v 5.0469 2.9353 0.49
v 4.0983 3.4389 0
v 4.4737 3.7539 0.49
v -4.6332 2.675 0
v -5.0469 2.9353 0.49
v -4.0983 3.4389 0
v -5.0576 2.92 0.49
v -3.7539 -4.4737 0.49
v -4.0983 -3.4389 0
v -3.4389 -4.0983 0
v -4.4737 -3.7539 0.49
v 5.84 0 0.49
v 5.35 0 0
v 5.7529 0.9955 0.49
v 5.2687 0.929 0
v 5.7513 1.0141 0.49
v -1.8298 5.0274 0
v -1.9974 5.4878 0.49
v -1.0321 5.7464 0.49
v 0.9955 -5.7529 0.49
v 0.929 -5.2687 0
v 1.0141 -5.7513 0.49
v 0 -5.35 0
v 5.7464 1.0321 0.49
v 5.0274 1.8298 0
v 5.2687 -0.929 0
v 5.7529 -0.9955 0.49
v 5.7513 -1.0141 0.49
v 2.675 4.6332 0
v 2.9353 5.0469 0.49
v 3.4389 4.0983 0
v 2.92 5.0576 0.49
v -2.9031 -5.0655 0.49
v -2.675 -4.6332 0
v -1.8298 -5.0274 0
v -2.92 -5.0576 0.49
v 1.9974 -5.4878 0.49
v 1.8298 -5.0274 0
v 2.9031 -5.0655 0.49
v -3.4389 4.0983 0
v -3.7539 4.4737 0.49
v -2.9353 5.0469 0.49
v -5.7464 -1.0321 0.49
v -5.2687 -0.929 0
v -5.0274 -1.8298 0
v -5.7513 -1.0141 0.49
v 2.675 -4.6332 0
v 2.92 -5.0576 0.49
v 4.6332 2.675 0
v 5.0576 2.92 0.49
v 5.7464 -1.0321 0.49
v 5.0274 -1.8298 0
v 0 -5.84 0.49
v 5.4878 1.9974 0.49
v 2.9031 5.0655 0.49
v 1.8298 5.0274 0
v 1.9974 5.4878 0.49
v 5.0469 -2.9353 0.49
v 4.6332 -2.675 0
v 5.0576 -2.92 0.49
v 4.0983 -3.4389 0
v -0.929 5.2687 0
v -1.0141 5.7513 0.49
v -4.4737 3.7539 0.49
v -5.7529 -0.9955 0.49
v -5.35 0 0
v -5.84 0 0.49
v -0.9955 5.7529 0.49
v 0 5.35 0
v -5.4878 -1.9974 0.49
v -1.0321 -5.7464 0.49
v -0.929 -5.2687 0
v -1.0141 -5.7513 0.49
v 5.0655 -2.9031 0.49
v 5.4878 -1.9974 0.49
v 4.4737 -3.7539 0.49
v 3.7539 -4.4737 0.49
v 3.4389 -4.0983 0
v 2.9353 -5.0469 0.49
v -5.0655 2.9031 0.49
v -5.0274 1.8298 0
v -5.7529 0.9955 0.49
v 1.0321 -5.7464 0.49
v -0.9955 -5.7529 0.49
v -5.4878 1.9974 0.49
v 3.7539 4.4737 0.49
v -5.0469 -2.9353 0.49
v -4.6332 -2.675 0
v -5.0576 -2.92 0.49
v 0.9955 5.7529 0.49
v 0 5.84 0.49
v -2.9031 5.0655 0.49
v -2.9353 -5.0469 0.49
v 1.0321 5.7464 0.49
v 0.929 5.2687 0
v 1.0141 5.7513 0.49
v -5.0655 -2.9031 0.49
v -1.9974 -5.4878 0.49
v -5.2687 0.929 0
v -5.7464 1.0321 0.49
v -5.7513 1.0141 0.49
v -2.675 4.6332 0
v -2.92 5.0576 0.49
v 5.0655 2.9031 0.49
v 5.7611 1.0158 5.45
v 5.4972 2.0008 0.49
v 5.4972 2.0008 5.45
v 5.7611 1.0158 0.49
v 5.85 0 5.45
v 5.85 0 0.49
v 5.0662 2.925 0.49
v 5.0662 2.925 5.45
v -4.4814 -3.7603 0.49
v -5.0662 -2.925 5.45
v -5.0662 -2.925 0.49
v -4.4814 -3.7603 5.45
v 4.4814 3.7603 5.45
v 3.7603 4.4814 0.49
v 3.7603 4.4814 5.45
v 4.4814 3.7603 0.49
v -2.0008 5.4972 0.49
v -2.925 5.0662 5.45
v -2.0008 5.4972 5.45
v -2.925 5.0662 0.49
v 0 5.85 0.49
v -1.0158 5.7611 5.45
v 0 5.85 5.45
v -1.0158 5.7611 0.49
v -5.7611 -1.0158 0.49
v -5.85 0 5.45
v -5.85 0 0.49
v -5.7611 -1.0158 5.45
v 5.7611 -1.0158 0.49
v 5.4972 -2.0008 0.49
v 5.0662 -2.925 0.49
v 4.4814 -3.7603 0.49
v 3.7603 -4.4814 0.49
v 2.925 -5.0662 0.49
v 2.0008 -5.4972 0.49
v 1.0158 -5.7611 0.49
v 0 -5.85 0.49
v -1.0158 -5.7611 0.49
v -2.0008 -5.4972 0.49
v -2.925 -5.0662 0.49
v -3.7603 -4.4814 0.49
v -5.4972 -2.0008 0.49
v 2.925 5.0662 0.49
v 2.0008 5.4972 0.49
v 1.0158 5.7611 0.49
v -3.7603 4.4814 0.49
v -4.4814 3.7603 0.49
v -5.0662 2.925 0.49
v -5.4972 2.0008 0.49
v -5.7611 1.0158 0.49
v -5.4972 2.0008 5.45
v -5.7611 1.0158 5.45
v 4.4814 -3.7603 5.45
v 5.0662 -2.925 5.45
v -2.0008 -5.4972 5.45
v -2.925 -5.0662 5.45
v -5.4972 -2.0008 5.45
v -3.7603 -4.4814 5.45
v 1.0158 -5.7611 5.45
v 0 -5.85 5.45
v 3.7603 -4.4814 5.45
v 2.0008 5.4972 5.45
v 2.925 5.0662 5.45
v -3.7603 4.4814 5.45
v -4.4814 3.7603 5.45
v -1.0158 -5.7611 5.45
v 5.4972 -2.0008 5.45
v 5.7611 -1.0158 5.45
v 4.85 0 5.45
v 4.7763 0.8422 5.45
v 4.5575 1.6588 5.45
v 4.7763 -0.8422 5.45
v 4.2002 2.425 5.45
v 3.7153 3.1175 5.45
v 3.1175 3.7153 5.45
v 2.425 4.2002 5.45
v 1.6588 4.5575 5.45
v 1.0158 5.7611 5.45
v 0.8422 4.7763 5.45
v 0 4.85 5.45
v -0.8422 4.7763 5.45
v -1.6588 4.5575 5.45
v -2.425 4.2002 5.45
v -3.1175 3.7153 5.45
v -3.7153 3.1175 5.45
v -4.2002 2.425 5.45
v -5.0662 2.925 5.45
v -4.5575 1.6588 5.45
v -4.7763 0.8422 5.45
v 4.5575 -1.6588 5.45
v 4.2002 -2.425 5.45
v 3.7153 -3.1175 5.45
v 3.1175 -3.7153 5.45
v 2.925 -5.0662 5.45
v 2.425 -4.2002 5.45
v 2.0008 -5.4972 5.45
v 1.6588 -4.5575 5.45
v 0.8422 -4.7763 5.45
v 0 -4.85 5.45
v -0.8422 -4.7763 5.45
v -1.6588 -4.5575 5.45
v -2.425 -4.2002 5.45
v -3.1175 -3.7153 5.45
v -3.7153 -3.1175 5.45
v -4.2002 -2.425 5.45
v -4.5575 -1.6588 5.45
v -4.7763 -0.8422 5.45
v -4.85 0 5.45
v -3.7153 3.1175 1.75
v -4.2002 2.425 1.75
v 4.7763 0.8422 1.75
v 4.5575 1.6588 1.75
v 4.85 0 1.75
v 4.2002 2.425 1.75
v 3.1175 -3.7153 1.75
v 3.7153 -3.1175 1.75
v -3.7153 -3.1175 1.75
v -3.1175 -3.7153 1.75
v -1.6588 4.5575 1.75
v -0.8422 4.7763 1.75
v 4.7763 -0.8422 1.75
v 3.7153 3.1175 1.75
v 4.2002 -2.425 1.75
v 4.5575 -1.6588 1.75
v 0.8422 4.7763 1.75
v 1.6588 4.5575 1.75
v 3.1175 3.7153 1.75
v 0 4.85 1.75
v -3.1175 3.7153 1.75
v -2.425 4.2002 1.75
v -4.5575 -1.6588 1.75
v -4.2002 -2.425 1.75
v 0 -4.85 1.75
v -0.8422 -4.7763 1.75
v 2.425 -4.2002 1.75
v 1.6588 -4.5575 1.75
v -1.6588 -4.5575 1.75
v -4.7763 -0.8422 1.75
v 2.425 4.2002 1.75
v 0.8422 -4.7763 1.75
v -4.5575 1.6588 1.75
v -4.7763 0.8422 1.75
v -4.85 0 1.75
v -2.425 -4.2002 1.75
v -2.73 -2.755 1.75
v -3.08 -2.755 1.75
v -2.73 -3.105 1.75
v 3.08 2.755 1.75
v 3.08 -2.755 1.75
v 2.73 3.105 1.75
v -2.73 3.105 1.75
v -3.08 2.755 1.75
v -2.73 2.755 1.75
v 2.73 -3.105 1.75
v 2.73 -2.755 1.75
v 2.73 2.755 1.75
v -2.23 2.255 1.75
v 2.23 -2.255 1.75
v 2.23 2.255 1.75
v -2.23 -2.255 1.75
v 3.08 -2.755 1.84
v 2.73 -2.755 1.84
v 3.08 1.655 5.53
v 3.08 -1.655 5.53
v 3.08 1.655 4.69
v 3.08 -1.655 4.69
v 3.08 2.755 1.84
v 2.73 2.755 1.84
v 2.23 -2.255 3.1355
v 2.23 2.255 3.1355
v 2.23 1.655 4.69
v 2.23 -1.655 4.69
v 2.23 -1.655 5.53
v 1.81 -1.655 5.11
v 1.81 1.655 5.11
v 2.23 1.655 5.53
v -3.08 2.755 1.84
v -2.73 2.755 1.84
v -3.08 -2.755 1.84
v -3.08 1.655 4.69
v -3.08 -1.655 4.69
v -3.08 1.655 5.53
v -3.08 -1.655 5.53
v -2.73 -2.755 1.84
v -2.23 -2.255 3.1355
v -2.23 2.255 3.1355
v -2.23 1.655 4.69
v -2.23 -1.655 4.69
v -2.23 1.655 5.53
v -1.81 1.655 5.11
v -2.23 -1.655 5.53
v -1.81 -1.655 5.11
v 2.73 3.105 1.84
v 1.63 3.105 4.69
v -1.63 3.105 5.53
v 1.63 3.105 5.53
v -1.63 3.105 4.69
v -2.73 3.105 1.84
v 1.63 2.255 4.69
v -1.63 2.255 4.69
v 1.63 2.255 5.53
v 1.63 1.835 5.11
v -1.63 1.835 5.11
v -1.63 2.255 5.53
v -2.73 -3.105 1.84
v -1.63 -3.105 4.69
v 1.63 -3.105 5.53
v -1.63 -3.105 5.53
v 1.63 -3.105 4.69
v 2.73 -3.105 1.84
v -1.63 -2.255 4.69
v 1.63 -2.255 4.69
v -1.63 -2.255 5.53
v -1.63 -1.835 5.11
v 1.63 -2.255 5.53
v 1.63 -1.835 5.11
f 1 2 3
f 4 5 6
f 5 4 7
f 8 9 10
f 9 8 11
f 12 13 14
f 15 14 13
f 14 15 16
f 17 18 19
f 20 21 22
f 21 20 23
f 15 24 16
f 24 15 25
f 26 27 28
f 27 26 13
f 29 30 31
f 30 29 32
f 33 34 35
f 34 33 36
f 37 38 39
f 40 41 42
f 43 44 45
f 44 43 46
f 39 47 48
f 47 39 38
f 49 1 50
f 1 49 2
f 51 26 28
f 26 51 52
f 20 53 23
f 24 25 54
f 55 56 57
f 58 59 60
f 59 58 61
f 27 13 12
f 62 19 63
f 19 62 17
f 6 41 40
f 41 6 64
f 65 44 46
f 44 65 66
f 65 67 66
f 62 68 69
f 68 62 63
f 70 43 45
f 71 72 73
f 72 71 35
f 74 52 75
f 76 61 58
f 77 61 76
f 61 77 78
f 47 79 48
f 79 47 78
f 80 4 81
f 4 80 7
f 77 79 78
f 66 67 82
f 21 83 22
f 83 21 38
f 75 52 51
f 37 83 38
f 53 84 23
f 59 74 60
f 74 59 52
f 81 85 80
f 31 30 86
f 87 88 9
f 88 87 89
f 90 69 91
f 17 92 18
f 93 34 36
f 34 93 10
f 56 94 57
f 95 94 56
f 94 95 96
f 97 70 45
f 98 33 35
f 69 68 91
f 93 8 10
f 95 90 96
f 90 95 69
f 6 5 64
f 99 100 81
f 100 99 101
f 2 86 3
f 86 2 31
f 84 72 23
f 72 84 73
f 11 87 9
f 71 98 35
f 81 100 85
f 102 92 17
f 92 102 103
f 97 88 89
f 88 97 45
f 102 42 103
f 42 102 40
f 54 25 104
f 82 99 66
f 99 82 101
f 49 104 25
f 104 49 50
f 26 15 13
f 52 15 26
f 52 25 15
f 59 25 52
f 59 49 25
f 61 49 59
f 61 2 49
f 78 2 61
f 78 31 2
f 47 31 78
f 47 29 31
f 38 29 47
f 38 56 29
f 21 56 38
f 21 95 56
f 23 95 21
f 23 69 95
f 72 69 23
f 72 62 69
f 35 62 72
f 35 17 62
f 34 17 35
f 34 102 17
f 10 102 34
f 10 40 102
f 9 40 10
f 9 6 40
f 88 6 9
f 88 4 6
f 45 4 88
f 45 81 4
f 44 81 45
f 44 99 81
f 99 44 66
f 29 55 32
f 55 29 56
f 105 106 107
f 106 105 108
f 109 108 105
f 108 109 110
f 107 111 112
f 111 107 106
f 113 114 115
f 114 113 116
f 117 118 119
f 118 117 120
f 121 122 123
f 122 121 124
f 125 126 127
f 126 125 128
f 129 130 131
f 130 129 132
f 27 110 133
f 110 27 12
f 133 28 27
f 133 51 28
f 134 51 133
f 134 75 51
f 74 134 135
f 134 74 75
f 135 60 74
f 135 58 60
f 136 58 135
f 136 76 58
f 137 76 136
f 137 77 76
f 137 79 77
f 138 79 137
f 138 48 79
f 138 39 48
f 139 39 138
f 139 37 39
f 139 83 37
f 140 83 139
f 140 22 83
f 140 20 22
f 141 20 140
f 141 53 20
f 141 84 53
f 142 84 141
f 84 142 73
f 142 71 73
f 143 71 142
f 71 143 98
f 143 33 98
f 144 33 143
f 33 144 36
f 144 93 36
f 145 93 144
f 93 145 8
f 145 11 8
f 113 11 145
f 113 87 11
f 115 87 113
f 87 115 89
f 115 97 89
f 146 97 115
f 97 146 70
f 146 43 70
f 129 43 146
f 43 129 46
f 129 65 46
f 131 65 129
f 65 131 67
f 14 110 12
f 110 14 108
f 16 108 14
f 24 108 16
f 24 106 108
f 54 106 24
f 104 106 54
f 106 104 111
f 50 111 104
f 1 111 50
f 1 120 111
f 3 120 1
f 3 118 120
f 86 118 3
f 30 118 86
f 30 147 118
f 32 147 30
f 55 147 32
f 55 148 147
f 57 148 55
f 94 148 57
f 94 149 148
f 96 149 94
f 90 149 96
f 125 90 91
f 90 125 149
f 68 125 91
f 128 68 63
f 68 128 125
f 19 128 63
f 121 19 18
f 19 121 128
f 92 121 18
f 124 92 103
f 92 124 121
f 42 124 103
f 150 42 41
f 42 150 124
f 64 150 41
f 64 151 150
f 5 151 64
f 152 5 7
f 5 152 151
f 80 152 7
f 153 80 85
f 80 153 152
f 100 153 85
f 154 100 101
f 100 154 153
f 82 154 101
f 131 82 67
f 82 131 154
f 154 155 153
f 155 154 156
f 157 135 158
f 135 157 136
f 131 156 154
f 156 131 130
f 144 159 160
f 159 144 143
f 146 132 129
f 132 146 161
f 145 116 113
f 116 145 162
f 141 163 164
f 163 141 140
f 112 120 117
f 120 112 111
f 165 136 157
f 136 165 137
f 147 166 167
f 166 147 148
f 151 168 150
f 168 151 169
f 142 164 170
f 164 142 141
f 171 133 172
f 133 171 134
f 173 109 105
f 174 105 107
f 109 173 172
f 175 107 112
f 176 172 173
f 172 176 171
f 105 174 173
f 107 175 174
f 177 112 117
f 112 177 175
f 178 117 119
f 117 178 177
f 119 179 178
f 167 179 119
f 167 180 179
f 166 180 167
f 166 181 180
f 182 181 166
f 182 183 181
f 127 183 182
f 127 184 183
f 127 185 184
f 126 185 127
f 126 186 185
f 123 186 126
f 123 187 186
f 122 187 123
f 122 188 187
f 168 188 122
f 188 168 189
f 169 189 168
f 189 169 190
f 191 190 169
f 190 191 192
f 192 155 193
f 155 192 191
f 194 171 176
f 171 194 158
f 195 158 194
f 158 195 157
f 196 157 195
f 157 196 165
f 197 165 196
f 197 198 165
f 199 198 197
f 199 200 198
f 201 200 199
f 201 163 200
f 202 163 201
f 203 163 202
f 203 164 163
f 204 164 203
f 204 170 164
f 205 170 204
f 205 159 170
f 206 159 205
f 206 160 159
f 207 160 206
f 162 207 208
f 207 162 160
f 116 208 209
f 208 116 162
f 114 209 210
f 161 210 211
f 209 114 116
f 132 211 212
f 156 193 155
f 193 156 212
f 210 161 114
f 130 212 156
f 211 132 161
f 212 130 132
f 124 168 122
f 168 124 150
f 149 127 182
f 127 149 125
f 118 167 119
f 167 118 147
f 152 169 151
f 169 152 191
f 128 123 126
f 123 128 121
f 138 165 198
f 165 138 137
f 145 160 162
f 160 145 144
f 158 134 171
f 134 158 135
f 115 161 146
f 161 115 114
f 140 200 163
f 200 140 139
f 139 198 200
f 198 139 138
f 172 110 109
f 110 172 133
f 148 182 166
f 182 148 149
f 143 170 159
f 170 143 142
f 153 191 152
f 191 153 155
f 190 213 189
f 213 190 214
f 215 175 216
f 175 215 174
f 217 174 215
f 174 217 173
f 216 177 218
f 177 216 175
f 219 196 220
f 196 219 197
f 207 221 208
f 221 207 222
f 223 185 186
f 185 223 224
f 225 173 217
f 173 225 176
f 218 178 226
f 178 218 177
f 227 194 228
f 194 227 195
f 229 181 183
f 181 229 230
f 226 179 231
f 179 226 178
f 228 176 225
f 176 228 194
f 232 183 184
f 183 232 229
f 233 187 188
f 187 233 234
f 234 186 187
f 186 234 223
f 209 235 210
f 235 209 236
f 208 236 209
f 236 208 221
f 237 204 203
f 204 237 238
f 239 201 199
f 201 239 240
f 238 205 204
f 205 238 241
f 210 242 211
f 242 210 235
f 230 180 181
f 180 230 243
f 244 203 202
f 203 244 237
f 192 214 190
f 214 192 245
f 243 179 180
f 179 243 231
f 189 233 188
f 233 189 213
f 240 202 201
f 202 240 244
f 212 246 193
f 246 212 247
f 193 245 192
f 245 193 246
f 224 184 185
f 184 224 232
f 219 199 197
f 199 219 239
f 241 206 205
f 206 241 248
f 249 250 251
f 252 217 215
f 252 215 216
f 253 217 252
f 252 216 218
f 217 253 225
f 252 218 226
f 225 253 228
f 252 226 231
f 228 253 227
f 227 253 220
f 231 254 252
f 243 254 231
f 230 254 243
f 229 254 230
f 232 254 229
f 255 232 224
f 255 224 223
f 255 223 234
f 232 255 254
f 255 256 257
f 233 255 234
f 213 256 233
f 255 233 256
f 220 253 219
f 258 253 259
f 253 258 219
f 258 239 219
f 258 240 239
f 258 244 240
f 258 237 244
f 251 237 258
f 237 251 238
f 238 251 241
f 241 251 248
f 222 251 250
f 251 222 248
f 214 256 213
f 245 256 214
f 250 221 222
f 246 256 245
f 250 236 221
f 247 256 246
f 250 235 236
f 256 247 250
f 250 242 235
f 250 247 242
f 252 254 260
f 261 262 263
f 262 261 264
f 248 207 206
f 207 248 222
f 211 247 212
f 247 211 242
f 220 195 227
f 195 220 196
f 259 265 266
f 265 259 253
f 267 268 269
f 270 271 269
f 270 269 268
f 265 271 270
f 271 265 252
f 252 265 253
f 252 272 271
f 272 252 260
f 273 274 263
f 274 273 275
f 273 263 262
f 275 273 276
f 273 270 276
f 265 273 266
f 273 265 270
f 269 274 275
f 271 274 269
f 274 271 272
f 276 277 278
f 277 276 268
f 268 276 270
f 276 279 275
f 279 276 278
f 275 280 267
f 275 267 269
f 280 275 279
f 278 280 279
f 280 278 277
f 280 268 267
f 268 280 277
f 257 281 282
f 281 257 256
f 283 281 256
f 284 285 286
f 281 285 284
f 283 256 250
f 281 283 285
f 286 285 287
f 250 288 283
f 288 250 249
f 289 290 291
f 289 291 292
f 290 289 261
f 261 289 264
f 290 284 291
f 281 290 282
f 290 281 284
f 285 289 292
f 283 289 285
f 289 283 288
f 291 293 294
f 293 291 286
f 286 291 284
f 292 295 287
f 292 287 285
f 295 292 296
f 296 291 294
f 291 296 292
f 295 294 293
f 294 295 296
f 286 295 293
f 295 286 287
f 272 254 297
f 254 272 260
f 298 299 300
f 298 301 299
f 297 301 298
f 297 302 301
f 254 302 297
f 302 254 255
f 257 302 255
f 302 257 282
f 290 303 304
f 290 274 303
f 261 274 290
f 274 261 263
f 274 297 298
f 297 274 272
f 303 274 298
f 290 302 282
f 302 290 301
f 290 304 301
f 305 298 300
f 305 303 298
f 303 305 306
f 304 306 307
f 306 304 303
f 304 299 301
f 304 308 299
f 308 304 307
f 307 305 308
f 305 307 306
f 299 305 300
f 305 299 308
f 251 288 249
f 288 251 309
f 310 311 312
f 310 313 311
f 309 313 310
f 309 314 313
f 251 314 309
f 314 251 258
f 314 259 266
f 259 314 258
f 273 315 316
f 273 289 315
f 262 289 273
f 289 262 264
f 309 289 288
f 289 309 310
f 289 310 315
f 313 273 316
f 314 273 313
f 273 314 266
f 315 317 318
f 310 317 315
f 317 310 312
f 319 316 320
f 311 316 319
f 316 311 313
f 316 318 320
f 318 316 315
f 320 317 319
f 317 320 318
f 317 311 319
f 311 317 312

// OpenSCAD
use <tubemesh.scad>;

// sideTol = 0.5 ok, but loose
// snapBump = 0.35

buttonDiameter = 11.7;
bottomBevel = 0.5;
buttonDepth = 5.45;
buttonWallThickness = 1;
buttonBottomThickness = 1.75;
attachmentSide1 = 3.81;
attachmentSide2 = 3.76;
attachmentHeight = 2.75;
attachmentSideTolerance = 0.35;
attachmentTopTolerance = 0.2;
snapWallThickness = 0.85;
snapSpacing = 0.25;
snapBump = 0.42;
snapBumpHeight = 0.4;
snapJoinedHeight = 0.1;

nudge = 0.01;

module snap1(length0) {
    z1 = attachmentHeight+attachmentTopTolerance;
    length = length0 - 2*snapSpacing;
    
    function section(length,bump,z) = sectionZ([[-bump,-length/2],[snapWallThickness,-length/2],[snapWallThickness,length/2],[-bump,length/2]],z);
    
    tubeMesh([section(length0+2*snapWallThickness,0,0),
        section(length0+2*snapWallThickness,0,snapJoinedHeight),
        section(length,0,z1),
        section(length,snapBump,z1+snapBump),
        section(length,0,z1+snapBump*2)]);
}

module snaps() {
    for (a=[0,180])
        rotate([0,0,a]) translate([attachmentSide2/2+attachmentSideTolerance,0,0]) snap1(attachmentSide1);
    for (a=[90,270])
        rotate([0,0,a]) translate([attachmentSide1/2+attachmentSideTolerance,0,0]) snap1(attachmentSide2);
}

$fn = 36;

module beveledCylinder(h=10,d=10,bevel=1) {
    cylinder(h=bevel,d1=d-2*bevel,d2=d);
    translate([0,0,bevel-nudge]) cylinder(h=h-bevel+nudge,d=d);
}

module button() {
    difference() {
        beveledCylinder(h=buttonDepth,d=buttonDiameter,bevel=bottomBevel);
        translate([0,0,buttonBottomThickness]) cylinder(h=buttonDepth,d=buttonDiameter-2*buttonWallThickness);
    }
}

button();
translate([0,0,buttonBottomThickness-nudge]) snaps();
